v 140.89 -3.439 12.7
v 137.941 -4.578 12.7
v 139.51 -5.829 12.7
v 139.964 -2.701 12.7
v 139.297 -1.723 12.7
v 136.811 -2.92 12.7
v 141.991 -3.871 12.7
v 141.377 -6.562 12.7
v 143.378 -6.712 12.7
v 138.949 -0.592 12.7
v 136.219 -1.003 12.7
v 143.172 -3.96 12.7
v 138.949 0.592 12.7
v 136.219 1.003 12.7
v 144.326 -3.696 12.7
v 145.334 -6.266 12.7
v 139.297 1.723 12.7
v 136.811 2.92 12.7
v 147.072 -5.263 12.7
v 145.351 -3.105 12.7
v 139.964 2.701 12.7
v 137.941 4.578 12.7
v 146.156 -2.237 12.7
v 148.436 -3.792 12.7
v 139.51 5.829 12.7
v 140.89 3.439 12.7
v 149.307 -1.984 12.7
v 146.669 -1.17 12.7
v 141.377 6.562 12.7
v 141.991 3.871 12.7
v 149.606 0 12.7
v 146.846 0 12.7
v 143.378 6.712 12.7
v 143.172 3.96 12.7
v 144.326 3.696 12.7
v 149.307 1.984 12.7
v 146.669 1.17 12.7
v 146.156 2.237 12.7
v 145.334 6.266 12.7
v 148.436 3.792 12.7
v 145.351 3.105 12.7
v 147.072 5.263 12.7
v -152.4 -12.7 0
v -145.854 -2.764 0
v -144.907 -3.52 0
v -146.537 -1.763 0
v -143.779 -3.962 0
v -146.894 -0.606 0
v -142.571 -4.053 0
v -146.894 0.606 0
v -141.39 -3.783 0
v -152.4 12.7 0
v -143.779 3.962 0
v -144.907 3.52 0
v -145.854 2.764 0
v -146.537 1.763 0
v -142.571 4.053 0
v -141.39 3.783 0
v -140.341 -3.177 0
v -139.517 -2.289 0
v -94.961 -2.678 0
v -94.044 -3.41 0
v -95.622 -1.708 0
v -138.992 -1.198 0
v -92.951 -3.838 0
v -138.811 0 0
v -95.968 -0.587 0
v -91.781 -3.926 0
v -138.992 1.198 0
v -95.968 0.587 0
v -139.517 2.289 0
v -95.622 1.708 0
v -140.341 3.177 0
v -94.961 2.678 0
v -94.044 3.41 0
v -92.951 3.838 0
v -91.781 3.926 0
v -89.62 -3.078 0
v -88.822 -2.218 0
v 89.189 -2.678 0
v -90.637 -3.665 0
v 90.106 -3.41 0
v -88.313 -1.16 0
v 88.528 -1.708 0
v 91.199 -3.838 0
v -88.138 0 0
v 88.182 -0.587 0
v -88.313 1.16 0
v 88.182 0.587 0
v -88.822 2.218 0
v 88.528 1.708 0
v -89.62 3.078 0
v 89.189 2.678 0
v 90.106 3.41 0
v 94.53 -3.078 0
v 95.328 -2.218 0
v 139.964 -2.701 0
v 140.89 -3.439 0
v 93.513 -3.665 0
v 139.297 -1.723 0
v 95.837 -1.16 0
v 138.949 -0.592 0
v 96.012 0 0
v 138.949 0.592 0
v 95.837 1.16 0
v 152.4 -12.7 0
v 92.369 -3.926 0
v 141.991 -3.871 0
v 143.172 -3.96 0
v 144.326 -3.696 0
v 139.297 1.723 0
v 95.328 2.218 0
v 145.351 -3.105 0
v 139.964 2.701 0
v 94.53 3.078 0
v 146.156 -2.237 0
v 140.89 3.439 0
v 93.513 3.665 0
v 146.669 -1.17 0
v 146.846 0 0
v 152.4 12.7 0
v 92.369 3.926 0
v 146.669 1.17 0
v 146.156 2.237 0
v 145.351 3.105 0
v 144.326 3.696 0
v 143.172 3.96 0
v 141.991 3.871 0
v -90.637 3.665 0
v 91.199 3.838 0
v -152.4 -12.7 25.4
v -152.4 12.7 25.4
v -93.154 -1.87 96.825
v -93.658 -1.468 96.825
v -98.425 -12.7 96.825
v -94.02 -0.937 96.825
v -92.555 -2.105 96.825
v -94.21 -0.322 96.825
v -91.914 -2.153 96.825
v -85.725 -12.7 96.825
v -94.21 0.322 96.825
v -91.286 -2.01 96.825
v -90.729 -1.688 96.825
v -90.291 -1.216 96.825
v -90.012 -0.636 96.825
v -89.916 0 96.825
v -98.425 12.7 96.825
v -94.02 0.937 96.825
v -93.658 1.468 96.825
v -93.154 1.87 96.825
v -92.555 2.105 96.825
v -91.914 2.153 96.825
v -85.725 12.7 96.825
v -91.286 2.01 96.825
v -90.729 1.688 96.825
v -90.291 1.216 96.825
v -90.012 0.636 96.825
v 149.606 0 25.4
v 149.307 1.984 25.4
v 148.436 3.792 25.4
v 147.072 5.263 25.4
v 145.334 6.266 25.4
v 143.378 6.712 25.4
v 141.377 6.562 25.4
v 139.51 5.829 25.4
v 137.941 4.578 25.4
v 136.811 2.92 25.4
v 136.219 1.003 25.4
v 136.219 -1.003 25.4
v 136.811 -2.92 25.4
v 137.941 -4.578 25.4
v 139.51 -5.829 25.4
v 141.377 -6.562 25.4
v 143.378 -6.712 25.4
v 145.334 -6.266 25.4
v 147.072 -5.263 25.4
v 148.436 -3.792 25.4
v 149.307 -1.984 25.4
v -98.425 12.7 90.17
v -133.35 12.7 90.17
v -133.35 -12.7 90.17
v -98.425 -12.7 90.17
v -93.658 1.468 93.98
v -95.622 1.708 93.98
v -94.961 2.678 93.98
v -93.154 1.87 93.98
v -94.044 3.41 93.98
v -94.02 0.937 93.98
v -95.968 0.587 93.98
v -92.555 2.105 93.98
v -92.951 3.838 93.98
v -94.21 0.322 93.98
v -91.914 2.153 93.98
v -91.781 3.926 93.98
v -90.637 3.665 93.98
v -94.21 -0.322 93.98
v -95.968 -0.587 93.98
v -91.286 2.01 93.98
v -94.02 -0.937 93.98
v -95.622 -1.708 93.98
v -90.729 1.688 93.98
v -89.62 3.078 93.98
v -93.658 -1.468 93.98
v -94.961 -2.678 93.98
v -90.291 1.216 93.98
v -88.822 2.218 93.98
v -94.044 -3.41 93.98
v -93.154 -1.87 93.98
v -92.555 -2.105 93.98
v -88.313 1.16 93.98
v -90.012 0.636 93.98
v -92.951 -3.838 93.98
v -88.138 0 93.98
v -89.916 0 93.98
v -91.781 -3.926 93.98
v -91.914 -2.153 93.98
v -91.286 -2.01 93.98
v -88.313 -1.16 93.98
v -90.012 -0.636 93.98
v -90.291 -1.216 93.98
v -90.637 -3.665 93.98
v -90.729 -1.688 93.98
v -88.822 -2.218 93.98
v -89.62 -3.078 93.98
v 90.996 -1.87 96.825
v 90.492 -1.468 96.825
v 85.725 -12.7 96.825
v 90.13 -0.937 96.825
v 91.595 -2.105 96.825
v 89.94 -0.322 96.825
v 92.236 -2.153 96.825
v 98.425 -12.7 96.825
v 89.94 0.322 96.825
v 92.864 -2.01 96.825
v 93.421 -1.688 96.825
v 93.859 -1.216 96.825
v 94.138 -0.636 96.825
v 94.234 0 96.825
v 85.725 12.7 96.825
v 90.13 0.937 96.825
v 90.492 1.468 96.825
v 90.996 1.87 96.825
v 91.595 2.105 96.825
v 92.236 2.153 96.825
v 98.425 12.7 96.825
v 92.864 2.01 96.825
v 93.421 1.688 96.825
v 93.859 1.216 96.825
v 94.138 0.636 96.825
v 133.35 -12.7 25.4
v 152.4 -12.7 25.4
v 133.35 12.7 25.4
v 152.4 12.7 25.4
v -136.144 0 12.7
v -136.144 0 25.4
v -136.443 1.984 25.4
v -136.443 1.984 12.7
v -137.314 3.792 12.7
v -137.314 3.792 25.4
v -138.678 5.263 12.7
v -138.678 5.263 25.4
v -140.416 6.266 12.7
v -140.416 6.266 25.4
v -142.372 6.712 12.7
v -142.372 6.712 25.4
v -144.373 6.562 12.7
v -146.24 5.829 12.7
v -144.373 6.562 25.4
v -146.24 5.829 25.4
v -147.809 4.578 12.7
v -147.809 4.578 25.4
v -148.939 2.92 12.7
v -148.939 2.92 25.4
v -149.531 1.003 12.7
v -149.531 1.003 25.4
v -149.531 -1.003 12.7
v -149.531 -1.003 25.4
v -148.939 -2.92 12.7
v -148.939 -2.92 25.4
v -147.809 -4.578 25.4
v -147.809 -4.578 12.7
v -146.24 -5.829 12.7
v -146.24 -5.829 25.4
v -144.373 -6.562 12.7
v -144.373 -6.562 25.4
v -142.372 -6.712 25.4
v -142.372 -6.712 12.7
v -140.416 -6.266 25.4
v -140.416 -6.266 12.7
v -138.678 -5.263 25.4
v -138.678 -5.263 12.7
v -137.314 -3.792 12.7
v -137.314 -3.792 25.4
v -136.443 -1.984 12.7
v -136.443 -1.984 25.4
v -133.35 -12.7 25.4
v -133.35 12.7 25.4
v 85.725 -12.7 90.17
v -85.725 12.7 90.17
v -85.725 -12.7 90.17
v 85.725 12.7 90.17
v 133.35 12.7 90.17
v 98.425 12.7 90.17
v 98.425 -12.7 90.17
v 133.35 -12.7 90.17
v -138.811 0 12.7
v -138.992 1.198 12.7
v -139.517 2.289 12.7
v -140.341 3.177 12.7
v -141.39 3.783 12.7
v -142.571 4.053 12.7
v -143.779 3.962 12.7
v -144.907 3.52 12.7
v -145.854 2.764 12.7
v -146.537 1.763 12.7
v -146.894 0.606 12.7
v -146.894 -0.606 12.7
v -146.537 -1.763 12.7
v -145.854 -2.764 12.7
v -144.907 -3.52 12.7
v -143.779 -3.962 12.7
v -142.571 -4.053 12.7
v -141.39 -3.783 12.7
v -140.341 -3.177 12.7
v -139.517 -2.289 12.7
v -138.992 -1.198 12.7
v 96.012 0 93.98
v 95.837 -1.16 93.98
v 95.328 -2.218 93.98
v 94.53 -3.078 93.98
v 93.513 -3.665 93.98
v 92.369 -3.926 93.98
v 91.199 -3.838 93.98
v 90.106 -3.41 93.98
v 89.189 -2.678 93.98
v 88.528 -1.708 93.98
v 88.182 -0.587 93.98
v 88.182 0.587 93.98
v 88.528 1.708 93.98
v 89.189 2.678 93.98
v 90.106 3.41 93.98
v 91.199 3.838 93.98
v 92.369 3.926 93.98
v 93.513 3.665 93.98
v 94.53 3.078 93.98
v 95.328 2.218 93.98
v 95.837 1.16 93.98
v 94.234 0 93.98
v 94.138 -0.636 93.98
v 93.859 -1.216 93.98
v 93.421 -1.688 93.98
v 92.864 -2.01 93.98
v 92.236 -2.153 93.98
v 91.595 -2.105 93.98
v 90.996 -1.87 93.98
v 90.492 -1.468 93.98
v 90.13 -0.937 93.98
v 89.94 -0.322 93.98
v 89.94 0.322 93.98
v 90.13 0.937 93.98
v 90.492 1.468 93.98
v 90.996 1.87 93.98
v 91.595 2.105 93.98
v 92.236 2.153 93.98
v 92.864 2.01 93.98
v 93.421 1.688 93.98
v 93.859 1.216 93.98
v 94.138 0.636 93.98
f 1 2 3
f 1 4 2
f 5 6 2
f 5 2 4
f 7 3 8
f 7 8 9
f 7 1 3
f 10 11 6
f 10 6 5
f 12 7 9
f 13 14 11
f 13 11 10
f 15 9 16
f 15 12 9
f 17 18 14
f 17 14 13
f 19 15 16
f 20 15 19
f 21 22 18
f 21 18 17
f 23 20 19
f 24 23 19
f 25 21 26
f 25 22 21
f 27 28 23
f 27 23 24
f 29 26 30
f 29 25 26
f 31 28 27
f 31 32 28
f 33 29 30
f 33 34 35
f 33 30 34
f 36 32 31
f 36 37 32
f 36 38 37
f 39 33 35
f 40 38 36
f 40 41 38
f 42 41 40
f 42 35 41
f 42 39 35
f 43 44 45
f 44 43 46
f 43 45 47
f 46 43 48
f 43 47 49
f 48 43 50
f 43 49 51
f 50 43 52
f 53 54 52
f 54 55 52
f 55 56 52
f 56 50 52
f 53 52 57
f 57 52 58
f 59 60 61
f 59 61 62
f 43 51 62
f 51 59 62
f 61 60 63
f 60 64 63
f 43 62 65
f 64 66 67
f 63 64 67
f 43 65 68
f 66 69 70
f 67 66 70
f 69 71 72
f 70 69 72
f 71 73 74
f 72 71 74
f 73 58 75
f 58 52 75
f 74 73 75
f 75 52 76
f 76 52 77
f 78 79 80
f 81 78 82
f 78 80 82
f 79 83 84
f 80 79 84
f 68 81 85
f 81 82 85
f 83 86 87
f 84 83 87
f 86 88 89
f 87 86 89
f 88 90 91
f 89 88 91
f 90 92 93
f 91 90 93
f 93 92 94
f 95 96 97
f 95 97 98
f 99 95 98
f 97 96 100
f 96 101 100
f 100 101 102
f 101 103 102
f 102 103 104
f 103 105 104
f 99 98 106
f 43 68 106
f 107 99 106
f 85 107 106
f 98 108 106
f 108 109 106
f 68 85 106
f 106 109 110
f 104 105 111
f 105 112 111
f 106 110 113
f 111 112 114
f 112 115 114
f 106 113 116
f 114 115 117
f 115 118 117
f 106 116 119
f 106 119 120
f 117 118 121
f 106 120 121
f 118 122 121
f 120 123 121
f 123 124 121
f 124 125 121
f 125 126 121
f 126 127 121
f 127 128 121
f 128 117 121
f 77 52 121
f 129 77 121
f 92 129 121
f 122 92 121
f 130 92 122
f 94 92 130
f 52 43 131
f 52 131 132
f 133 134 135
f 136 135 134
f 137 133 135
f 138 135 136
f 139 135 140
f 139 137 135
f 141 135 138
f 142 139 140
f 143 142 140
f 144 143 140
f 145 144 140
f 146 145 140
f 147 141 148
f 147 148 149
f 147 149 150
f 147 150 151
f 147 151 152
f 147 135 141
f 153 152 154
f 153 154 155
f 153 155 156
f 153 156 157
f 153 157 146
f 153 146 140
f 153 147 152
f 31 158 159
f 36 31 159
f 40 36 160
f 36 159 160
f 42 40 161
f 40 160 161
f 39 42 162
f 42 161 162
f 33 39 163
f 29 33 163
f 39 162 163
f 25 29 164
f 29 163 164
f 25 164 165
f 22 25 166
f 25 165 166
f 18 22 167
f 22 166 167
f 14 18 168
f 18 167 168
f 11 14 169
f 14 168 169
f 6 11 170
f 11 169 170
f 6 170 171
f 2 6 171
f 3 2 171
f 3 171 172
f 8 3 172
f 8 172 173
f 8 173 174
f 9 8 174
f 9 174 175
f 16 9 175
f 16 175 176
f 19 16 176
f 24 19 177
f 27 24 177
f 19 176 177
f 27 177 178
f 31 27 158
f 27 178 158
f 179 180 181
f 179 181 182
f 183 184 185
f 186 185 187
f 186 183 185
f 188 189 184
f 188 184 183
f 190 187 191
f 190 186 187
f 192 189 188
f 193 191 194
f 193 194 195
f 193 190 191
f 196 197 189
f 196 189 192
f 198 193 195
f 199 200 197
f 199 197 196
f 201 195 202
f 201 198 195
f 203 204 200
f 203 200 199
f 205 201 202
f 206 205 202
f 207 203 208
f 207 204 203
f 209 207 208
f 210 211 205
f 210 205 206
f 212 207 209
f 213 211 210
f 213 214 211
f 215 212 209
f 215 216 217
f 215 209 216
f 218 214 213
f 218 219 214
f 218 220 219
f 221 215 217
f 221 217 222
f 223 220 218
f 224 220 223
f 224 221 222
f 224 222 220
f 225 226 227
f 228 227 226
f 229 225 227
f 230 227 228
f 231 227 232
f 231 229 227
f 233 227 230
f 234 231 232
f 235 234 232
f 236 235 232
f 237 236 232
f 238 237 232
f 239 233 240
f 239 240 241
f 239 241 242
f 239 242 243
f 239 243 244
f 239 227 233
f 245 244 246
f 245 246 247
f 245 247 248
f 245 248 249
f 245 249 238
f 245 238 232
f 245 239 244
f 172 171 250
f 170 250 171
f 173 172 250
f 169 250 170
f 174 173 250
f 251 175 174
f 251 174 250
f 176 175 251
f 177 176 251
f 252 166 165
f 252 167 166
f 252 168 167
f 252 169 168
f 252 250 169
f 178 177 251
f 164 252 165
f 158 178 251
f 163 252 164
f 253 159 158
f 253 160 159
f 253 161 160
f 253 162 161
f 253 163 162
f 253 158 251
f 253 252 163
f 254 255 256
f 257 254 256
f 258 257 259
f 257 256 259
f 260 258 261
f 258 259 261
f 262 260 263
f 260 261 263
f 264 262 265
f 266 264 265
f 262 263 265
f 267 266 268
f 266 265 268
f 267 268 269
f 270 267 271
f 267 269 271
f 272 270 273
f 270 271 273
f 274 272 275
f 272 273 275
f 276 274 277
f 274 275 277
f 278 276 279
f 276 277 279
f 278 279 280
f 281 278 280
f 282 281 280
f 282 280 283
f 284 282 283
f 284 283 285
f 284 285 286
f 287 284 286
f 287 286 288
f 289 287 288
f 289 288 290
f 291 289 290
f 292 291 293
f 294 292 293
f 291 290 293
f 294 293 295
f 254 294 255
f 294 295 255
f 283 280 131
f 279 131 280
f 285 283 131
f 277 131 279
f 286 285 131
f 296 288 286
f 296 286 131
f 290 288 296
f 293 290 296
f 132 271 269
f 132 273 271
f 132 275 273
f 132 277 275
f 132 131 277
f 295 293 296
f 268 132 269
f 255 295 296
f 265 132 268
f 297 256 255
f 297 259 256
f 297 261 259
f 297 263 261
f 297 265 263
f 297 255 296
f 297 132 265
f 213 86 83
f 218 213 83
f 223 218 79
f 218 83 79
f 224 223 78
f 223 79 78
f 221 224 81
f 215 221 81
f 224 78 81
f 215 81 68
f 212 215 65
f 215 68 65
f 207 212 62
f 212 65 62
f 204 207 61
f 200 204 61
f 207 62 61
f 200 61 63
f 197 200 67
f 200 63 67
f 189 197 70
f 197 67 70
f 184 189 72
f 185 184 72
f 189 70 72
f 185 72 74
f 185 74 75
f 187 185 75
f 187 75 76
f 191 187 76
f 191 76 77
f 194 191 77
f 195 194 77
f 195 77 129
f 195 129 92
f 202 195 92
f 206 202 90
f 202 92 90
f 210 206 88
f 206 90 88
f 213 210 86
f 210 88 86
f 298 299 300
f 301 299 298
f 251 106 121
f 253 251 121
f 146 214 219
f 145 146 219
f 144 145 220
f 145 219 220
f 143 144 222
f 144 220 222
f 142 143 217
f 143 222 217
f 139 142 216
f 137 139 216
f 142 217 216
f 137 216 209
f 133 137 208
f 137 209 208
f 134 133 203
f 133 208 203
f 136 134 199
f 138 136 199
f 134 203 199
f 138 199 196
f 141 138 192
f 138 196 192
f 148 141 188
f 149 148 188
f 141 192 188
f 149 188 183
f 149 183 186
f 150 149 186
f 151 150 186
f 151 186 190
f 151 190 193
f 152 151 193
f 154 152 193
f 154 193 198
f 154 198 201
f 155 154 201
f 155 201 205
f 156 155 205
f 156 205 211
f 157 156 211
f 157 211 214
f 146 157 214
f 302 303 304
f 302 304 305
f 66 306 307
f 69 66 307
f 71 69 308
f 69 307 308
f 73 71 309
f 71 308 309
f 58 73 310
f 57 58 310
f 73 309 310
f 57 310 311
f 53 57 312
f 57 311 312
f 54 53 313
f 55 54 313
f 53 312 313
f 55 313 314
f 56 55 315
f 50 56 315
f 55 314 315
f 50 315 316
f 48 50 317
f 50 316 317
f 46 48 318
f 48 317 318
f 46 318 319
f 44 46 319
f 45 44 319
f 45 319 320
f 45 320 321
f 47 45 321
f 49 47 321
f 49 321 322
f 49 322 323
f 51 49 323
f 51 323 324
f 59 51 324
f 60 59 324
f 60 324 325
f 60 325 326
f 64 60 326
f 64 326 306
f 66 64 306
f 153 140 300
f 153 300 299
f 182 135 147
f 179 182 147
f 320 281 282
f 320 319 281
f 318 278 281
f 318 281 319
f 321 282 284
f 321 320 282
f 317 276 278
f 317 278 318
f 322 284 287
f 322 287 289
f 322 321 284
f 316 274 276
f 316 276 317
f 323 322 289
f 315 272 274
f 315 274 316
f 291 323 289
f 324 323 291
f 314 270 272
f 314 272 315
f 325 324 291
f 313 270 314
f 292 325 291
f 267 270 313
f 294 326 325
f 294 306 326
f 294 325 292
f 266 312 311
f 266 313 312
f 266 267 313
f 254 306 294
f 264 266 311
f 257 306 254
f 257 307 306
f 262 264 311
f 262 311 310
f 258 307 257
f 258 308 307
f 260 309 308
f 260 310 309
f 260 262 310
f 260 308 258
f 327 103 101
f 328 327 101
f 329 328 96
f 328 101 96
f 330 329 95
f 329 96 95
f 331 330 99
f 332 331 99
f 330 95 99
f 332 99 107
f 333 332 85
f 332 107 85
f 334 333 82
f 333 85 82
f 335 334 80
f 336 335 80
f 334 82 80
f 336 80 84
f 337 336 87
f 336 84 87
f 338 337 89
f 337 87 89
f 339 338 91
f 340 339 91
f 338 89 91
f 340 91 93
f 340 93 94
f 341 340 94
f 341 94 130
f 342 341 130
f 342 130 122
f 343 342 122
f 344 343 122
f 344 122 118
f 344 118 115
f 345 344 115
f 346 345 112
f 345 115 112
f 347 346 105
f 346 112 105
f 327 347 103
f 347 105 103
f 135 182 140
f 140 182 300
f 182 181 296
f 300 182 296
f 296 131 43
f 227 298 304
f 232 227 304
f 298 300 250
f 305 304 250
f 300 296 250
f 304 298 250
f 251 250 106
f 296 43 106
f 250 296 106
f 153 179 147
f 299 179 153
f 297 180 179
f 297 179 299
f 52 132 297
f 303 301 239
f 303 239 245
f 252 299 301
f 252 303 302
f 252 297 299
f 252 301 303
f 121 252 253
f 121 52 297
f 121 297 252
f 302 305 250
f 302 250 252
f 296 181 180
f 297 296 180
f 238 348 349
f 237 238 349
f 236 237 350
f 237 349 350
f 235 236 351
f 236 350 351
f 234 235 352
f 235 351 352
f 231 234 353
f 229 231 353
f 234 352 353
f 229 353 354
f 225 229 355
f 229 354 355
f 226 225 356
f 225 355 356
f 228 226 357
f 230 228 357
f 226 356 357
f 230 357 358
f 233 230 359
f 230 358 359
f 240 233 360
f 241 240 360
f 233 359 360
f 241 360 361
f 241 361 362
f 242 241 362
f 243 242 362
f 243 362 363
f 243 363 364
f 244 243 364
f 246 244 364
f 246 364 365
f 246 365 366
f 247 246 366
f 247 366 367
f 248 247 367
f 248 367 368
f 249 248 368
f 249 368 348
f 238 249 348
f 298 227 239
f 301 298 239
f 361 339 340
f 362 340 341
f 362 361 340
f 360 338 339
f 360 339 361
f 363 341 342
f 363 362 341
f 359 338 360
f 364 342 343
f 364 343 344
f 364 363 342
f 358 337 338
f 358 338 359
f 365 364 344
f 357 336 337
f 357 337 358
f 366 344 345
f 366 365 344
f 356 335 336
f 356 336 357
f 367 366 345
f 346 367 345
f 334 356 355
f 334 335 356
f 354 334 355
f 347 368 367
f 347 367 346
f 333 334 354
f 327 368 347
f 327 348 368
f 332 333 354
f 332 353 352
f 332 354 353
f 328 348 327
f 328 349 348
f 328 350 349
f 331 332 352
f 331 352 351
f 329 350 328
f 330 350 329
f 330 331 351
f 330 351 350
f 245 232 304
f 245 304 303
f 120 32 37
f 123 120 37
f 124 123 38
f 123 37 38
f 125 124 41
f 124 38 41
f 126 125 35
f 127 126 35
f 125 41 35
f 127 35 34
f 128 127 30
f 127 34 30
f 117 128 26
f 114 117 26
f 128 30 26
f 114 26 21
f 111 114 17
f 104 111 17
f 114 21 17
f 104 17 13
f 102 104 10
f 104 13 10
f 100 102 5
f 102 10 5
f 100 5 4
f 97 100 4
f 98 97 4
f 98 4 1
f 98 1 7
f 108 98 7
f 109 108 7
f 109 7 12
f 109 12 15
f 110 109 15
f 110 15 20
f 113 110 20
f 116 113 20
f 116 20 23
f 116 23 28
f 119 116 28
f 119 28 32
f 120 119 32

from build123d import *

# Parameters (mm, degrees)
F0_W      = 304.8
F0_H      = 25.4
F1_DEPTH  = 96.8248
F2_W      = 19.05
F2_H      = 25.4
F3_DEPTH  = 71.4248
F4_W      = 34.925
F4_H      = 25.4
F4_W_2    = 171.45
F5_DEPTH  = 6.6548
F6_R      = 2.159
F7_DEPTH  = 96.8258
F8_R      = 3.937
F9_DEPTH  = 93.98
F10_R     = 3.970807
F10_R_2   = 4.064
F11_DEPTH = 25.401
F10_R_3   = 6.731
F12_DEPTH = 12.7


with BuildPart() as f1:
    # F0 (on Top) → F1 (new body)
    with BuildSketch(Plane.XY):
        Rectangle(F0_W, F0_H)
    extrude(amount=F1_DEPTH)

    # F2 (on face) → F3 (cut)
    with BuildSketch(Plane.XY.offset(96.8248)):
        with Locations((-142.875, 0)):
            Rectangle(F2_W, F2_H)
        with Locations((142.875, 0)):
            Rectangle(F2_W, F2_H)
    extrude(amount=-F3_DEPTH, mode=Mode.SUBTRACT)

    # F4 (on face) → F5 (cut)
    with BuildSketch(Plane.XY.offset(96.8248)):
        with Locations((-115.8875, 0)):
            Rectangle(F4_W, F4_H)
        Rectangle(F4_W_2, F4_H)
        with Locations((115.8875, 0)):
            Rectangle(F4_W, F4_H)
    extrude(amount=-F5_DEPTH, mode=Mode.SUBTRACT)

    # F6 (on face) → F7 (cut, through all)
    with BuildSketch(Plane(origin=(0, 0, 0), x_dir=(1, 0, 0), z_dir=(0, 0, -1))):
        with Locations((-92.075, 0)):
            Circle(F6_R)
        with Locations((92.075, 0)):
            Circle(F6_R)
    extrude(amount=-F7_DEPTH, mode=Mode.SUBTRACT)

    # F8 (on face) → F9 (cut)
    with BuildSketch(Plane(origin=(0, 0, 0), x_dir=(1, 0, 0), z_dir=(0, 0, -1))):
        with Locations((-92.075, 0)):
            Circle(F8_R)
        with Locations((92.075, 0)):
            Circle(F8_R)
    extrude(amount=-F9_DEPTH, mode=Mode.SUBTRACT)

    # F10 (on face) → F11 (cut, through all)
    with BuildSketch(Plane.XY.offset(25.4)):
        with Locations((142.875, 0)):
            Circle(F10_R)
        with Locations((-142.875, 0)):
            Circle(F10_R_2)
    extrude(amount=-F11_DEPTH, mode=Mode.SUBTRACT)

    # F10 (on face) → F12 (cut)
    with BuildSketch(Plane.XY.offset(25.4)):
        with Locations((-142.875, 0)):
            Circle(F10_R_3)
        with Locations((-142.875, 0)):
            Circle(F10_R_2, mode=Mode.SUBTRACT)
        with Locations((142.875, 0)):
            Circle(F10_R_3)
        with Locations((142.875, 0)):
            Circle(F10_R, mode=Mode.SUBTRACT)
    extrude(amount=-F12_DEPTH, mode=Mode.SUBTRACT)


solid = f1.part
